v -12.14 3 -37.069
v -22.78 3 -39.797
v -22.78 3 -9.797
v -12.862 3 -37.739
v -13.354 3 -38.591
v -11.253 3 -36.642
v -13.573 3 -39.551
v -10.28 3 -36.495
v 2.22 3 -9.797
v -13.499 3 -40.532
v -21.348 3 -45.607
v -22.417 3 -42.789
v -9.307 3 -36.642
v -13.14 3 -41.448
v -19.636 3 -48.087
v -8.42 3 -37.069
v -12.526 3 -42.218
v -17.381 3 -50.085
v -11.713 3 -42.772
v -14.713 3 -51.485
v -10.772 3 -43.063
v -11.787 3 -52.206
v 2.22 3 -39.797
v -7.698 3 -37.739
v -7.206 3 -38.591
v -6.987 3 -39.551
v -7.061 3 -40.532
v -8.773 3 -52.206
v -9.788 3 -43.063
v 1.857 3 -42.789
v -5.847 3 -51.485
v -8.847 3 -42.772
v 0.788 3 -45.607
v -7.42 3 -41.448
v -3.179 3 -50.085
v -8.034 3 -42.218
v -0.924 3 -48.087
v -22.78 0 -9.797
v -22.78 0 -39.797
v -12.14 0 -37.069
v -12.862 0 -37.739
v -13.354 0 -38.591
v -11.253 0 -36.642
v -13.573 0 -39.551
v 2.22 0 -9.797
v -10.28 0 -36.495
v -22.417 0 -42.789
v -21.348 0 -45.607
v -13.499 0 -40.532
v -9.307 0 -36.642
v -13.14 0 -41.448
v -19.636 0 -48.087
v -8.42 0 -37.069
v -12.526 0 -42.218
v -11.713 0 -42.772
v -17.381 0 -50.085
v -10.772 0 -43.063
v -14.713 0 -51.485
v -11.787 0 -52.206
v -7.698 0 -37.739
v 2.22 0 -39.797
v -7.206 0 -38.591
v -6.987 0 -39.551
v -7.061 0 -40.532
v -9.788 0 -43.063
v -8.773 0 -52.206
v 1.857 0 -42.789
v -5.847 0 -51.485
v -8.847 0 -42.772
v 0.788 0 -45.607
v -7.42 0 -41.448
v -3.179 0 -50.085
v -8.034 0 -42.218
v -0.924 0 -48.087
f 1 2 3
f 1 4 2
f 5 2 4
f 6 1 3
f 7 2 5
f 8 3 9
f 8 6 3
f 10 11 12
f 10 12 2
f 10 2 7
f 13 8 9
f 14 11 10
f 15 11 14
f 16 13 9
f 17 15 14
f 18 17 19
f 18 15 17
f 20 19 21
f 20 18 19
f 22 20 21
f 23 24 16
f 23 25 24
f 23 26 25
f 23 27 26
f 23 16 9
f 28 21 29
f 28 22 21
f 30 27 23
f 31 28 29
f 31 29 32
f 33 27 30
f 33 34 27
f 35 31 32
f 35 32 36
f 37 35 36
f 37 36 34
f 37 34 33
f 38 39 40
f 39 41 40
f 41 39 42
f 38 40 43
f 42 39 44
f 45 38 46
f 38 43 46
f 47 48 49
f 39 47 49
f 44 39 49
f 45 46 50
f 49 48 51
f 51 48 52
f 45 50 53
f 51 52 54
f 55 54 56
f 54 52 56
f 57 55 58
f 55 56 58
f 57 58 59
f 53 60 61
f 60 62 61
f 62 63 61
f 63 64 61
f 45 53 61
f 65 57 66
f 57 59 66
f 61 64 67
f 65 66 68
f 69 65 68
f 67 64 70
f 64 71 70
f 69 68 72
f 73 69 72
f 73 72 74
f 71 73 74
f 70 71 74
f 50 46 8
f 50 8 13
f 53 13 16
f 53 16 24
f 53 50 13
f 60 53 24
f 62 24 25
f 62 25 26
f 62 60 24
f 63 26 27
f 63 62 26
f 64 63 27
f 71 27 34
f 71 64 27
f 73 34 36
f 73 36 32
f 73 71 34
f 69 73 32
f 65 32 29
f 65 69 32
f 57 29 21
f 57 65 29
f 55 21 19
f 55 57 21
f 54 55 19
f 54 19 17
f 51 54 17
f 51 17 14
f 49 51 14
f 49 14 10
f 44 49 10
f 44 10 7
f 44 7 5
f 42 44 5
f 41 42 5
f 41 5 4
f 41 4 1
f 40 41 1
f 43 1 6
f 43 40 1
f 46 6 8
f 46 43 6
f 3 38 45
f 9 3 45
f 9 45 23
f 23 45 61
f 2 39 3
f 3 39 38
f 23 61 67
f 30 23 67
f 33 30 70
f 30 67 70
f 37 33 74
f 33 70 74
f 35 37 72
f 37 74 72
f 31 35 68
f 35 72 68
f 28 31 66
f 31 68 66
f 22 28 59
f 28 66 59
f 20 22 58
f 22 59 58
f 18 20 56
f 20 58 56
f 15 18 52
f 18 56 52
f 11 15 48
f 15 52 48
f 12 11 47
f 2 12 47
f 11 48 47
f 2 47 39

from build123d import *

# Parameters (mm, degrees)
SKETCH1_R           = 12.5
SKETCH1_R_2         = 3.302
BOSS_EXTRUDE1_DEPTH = 3


with BuildPart() as part:
    # Sketch1 → Boss-Extrude1 (new body)
    # profile 1 of 2: a face of its own
    with BuildSketch(Plane(origin=(0, 0, 0), x_dir=(1, 0, 0), z_dir=(0, 1, 0))):
        with BuildLine():
            ThreePointArc((2.22, 39.797498044), (-10.28, 27.297498044), (-22.78, 39.797498044))
            Line((-22.78, 39.797498044), (-22.78, 9.797498044))
            Line((-22.78, 9.797498044), (2.22, 9.797498044))
            Line((2.22, 9.797498044), (2.22, 39.797498044))
        make_face()
    # profile 2 of 2: a face of its own
    with BuildSketch(Plane(origin=(0, 0, 0), x_dir=(1, 0, 0), z_dir=(0, 1, 0))):
        with Locations((-10.28, 39.797498044)):
            Circle(SKETCH1_R)
        with Locations(Location((-10.28, 39.797498044, 0), (0, 0, 270))):
            Circle(SKETCH1_R_2, mode=Mode.SUBTRACT)
    extrude(amount=BOSS_EXTRUDE1_DEPTH)


solid = part.part
